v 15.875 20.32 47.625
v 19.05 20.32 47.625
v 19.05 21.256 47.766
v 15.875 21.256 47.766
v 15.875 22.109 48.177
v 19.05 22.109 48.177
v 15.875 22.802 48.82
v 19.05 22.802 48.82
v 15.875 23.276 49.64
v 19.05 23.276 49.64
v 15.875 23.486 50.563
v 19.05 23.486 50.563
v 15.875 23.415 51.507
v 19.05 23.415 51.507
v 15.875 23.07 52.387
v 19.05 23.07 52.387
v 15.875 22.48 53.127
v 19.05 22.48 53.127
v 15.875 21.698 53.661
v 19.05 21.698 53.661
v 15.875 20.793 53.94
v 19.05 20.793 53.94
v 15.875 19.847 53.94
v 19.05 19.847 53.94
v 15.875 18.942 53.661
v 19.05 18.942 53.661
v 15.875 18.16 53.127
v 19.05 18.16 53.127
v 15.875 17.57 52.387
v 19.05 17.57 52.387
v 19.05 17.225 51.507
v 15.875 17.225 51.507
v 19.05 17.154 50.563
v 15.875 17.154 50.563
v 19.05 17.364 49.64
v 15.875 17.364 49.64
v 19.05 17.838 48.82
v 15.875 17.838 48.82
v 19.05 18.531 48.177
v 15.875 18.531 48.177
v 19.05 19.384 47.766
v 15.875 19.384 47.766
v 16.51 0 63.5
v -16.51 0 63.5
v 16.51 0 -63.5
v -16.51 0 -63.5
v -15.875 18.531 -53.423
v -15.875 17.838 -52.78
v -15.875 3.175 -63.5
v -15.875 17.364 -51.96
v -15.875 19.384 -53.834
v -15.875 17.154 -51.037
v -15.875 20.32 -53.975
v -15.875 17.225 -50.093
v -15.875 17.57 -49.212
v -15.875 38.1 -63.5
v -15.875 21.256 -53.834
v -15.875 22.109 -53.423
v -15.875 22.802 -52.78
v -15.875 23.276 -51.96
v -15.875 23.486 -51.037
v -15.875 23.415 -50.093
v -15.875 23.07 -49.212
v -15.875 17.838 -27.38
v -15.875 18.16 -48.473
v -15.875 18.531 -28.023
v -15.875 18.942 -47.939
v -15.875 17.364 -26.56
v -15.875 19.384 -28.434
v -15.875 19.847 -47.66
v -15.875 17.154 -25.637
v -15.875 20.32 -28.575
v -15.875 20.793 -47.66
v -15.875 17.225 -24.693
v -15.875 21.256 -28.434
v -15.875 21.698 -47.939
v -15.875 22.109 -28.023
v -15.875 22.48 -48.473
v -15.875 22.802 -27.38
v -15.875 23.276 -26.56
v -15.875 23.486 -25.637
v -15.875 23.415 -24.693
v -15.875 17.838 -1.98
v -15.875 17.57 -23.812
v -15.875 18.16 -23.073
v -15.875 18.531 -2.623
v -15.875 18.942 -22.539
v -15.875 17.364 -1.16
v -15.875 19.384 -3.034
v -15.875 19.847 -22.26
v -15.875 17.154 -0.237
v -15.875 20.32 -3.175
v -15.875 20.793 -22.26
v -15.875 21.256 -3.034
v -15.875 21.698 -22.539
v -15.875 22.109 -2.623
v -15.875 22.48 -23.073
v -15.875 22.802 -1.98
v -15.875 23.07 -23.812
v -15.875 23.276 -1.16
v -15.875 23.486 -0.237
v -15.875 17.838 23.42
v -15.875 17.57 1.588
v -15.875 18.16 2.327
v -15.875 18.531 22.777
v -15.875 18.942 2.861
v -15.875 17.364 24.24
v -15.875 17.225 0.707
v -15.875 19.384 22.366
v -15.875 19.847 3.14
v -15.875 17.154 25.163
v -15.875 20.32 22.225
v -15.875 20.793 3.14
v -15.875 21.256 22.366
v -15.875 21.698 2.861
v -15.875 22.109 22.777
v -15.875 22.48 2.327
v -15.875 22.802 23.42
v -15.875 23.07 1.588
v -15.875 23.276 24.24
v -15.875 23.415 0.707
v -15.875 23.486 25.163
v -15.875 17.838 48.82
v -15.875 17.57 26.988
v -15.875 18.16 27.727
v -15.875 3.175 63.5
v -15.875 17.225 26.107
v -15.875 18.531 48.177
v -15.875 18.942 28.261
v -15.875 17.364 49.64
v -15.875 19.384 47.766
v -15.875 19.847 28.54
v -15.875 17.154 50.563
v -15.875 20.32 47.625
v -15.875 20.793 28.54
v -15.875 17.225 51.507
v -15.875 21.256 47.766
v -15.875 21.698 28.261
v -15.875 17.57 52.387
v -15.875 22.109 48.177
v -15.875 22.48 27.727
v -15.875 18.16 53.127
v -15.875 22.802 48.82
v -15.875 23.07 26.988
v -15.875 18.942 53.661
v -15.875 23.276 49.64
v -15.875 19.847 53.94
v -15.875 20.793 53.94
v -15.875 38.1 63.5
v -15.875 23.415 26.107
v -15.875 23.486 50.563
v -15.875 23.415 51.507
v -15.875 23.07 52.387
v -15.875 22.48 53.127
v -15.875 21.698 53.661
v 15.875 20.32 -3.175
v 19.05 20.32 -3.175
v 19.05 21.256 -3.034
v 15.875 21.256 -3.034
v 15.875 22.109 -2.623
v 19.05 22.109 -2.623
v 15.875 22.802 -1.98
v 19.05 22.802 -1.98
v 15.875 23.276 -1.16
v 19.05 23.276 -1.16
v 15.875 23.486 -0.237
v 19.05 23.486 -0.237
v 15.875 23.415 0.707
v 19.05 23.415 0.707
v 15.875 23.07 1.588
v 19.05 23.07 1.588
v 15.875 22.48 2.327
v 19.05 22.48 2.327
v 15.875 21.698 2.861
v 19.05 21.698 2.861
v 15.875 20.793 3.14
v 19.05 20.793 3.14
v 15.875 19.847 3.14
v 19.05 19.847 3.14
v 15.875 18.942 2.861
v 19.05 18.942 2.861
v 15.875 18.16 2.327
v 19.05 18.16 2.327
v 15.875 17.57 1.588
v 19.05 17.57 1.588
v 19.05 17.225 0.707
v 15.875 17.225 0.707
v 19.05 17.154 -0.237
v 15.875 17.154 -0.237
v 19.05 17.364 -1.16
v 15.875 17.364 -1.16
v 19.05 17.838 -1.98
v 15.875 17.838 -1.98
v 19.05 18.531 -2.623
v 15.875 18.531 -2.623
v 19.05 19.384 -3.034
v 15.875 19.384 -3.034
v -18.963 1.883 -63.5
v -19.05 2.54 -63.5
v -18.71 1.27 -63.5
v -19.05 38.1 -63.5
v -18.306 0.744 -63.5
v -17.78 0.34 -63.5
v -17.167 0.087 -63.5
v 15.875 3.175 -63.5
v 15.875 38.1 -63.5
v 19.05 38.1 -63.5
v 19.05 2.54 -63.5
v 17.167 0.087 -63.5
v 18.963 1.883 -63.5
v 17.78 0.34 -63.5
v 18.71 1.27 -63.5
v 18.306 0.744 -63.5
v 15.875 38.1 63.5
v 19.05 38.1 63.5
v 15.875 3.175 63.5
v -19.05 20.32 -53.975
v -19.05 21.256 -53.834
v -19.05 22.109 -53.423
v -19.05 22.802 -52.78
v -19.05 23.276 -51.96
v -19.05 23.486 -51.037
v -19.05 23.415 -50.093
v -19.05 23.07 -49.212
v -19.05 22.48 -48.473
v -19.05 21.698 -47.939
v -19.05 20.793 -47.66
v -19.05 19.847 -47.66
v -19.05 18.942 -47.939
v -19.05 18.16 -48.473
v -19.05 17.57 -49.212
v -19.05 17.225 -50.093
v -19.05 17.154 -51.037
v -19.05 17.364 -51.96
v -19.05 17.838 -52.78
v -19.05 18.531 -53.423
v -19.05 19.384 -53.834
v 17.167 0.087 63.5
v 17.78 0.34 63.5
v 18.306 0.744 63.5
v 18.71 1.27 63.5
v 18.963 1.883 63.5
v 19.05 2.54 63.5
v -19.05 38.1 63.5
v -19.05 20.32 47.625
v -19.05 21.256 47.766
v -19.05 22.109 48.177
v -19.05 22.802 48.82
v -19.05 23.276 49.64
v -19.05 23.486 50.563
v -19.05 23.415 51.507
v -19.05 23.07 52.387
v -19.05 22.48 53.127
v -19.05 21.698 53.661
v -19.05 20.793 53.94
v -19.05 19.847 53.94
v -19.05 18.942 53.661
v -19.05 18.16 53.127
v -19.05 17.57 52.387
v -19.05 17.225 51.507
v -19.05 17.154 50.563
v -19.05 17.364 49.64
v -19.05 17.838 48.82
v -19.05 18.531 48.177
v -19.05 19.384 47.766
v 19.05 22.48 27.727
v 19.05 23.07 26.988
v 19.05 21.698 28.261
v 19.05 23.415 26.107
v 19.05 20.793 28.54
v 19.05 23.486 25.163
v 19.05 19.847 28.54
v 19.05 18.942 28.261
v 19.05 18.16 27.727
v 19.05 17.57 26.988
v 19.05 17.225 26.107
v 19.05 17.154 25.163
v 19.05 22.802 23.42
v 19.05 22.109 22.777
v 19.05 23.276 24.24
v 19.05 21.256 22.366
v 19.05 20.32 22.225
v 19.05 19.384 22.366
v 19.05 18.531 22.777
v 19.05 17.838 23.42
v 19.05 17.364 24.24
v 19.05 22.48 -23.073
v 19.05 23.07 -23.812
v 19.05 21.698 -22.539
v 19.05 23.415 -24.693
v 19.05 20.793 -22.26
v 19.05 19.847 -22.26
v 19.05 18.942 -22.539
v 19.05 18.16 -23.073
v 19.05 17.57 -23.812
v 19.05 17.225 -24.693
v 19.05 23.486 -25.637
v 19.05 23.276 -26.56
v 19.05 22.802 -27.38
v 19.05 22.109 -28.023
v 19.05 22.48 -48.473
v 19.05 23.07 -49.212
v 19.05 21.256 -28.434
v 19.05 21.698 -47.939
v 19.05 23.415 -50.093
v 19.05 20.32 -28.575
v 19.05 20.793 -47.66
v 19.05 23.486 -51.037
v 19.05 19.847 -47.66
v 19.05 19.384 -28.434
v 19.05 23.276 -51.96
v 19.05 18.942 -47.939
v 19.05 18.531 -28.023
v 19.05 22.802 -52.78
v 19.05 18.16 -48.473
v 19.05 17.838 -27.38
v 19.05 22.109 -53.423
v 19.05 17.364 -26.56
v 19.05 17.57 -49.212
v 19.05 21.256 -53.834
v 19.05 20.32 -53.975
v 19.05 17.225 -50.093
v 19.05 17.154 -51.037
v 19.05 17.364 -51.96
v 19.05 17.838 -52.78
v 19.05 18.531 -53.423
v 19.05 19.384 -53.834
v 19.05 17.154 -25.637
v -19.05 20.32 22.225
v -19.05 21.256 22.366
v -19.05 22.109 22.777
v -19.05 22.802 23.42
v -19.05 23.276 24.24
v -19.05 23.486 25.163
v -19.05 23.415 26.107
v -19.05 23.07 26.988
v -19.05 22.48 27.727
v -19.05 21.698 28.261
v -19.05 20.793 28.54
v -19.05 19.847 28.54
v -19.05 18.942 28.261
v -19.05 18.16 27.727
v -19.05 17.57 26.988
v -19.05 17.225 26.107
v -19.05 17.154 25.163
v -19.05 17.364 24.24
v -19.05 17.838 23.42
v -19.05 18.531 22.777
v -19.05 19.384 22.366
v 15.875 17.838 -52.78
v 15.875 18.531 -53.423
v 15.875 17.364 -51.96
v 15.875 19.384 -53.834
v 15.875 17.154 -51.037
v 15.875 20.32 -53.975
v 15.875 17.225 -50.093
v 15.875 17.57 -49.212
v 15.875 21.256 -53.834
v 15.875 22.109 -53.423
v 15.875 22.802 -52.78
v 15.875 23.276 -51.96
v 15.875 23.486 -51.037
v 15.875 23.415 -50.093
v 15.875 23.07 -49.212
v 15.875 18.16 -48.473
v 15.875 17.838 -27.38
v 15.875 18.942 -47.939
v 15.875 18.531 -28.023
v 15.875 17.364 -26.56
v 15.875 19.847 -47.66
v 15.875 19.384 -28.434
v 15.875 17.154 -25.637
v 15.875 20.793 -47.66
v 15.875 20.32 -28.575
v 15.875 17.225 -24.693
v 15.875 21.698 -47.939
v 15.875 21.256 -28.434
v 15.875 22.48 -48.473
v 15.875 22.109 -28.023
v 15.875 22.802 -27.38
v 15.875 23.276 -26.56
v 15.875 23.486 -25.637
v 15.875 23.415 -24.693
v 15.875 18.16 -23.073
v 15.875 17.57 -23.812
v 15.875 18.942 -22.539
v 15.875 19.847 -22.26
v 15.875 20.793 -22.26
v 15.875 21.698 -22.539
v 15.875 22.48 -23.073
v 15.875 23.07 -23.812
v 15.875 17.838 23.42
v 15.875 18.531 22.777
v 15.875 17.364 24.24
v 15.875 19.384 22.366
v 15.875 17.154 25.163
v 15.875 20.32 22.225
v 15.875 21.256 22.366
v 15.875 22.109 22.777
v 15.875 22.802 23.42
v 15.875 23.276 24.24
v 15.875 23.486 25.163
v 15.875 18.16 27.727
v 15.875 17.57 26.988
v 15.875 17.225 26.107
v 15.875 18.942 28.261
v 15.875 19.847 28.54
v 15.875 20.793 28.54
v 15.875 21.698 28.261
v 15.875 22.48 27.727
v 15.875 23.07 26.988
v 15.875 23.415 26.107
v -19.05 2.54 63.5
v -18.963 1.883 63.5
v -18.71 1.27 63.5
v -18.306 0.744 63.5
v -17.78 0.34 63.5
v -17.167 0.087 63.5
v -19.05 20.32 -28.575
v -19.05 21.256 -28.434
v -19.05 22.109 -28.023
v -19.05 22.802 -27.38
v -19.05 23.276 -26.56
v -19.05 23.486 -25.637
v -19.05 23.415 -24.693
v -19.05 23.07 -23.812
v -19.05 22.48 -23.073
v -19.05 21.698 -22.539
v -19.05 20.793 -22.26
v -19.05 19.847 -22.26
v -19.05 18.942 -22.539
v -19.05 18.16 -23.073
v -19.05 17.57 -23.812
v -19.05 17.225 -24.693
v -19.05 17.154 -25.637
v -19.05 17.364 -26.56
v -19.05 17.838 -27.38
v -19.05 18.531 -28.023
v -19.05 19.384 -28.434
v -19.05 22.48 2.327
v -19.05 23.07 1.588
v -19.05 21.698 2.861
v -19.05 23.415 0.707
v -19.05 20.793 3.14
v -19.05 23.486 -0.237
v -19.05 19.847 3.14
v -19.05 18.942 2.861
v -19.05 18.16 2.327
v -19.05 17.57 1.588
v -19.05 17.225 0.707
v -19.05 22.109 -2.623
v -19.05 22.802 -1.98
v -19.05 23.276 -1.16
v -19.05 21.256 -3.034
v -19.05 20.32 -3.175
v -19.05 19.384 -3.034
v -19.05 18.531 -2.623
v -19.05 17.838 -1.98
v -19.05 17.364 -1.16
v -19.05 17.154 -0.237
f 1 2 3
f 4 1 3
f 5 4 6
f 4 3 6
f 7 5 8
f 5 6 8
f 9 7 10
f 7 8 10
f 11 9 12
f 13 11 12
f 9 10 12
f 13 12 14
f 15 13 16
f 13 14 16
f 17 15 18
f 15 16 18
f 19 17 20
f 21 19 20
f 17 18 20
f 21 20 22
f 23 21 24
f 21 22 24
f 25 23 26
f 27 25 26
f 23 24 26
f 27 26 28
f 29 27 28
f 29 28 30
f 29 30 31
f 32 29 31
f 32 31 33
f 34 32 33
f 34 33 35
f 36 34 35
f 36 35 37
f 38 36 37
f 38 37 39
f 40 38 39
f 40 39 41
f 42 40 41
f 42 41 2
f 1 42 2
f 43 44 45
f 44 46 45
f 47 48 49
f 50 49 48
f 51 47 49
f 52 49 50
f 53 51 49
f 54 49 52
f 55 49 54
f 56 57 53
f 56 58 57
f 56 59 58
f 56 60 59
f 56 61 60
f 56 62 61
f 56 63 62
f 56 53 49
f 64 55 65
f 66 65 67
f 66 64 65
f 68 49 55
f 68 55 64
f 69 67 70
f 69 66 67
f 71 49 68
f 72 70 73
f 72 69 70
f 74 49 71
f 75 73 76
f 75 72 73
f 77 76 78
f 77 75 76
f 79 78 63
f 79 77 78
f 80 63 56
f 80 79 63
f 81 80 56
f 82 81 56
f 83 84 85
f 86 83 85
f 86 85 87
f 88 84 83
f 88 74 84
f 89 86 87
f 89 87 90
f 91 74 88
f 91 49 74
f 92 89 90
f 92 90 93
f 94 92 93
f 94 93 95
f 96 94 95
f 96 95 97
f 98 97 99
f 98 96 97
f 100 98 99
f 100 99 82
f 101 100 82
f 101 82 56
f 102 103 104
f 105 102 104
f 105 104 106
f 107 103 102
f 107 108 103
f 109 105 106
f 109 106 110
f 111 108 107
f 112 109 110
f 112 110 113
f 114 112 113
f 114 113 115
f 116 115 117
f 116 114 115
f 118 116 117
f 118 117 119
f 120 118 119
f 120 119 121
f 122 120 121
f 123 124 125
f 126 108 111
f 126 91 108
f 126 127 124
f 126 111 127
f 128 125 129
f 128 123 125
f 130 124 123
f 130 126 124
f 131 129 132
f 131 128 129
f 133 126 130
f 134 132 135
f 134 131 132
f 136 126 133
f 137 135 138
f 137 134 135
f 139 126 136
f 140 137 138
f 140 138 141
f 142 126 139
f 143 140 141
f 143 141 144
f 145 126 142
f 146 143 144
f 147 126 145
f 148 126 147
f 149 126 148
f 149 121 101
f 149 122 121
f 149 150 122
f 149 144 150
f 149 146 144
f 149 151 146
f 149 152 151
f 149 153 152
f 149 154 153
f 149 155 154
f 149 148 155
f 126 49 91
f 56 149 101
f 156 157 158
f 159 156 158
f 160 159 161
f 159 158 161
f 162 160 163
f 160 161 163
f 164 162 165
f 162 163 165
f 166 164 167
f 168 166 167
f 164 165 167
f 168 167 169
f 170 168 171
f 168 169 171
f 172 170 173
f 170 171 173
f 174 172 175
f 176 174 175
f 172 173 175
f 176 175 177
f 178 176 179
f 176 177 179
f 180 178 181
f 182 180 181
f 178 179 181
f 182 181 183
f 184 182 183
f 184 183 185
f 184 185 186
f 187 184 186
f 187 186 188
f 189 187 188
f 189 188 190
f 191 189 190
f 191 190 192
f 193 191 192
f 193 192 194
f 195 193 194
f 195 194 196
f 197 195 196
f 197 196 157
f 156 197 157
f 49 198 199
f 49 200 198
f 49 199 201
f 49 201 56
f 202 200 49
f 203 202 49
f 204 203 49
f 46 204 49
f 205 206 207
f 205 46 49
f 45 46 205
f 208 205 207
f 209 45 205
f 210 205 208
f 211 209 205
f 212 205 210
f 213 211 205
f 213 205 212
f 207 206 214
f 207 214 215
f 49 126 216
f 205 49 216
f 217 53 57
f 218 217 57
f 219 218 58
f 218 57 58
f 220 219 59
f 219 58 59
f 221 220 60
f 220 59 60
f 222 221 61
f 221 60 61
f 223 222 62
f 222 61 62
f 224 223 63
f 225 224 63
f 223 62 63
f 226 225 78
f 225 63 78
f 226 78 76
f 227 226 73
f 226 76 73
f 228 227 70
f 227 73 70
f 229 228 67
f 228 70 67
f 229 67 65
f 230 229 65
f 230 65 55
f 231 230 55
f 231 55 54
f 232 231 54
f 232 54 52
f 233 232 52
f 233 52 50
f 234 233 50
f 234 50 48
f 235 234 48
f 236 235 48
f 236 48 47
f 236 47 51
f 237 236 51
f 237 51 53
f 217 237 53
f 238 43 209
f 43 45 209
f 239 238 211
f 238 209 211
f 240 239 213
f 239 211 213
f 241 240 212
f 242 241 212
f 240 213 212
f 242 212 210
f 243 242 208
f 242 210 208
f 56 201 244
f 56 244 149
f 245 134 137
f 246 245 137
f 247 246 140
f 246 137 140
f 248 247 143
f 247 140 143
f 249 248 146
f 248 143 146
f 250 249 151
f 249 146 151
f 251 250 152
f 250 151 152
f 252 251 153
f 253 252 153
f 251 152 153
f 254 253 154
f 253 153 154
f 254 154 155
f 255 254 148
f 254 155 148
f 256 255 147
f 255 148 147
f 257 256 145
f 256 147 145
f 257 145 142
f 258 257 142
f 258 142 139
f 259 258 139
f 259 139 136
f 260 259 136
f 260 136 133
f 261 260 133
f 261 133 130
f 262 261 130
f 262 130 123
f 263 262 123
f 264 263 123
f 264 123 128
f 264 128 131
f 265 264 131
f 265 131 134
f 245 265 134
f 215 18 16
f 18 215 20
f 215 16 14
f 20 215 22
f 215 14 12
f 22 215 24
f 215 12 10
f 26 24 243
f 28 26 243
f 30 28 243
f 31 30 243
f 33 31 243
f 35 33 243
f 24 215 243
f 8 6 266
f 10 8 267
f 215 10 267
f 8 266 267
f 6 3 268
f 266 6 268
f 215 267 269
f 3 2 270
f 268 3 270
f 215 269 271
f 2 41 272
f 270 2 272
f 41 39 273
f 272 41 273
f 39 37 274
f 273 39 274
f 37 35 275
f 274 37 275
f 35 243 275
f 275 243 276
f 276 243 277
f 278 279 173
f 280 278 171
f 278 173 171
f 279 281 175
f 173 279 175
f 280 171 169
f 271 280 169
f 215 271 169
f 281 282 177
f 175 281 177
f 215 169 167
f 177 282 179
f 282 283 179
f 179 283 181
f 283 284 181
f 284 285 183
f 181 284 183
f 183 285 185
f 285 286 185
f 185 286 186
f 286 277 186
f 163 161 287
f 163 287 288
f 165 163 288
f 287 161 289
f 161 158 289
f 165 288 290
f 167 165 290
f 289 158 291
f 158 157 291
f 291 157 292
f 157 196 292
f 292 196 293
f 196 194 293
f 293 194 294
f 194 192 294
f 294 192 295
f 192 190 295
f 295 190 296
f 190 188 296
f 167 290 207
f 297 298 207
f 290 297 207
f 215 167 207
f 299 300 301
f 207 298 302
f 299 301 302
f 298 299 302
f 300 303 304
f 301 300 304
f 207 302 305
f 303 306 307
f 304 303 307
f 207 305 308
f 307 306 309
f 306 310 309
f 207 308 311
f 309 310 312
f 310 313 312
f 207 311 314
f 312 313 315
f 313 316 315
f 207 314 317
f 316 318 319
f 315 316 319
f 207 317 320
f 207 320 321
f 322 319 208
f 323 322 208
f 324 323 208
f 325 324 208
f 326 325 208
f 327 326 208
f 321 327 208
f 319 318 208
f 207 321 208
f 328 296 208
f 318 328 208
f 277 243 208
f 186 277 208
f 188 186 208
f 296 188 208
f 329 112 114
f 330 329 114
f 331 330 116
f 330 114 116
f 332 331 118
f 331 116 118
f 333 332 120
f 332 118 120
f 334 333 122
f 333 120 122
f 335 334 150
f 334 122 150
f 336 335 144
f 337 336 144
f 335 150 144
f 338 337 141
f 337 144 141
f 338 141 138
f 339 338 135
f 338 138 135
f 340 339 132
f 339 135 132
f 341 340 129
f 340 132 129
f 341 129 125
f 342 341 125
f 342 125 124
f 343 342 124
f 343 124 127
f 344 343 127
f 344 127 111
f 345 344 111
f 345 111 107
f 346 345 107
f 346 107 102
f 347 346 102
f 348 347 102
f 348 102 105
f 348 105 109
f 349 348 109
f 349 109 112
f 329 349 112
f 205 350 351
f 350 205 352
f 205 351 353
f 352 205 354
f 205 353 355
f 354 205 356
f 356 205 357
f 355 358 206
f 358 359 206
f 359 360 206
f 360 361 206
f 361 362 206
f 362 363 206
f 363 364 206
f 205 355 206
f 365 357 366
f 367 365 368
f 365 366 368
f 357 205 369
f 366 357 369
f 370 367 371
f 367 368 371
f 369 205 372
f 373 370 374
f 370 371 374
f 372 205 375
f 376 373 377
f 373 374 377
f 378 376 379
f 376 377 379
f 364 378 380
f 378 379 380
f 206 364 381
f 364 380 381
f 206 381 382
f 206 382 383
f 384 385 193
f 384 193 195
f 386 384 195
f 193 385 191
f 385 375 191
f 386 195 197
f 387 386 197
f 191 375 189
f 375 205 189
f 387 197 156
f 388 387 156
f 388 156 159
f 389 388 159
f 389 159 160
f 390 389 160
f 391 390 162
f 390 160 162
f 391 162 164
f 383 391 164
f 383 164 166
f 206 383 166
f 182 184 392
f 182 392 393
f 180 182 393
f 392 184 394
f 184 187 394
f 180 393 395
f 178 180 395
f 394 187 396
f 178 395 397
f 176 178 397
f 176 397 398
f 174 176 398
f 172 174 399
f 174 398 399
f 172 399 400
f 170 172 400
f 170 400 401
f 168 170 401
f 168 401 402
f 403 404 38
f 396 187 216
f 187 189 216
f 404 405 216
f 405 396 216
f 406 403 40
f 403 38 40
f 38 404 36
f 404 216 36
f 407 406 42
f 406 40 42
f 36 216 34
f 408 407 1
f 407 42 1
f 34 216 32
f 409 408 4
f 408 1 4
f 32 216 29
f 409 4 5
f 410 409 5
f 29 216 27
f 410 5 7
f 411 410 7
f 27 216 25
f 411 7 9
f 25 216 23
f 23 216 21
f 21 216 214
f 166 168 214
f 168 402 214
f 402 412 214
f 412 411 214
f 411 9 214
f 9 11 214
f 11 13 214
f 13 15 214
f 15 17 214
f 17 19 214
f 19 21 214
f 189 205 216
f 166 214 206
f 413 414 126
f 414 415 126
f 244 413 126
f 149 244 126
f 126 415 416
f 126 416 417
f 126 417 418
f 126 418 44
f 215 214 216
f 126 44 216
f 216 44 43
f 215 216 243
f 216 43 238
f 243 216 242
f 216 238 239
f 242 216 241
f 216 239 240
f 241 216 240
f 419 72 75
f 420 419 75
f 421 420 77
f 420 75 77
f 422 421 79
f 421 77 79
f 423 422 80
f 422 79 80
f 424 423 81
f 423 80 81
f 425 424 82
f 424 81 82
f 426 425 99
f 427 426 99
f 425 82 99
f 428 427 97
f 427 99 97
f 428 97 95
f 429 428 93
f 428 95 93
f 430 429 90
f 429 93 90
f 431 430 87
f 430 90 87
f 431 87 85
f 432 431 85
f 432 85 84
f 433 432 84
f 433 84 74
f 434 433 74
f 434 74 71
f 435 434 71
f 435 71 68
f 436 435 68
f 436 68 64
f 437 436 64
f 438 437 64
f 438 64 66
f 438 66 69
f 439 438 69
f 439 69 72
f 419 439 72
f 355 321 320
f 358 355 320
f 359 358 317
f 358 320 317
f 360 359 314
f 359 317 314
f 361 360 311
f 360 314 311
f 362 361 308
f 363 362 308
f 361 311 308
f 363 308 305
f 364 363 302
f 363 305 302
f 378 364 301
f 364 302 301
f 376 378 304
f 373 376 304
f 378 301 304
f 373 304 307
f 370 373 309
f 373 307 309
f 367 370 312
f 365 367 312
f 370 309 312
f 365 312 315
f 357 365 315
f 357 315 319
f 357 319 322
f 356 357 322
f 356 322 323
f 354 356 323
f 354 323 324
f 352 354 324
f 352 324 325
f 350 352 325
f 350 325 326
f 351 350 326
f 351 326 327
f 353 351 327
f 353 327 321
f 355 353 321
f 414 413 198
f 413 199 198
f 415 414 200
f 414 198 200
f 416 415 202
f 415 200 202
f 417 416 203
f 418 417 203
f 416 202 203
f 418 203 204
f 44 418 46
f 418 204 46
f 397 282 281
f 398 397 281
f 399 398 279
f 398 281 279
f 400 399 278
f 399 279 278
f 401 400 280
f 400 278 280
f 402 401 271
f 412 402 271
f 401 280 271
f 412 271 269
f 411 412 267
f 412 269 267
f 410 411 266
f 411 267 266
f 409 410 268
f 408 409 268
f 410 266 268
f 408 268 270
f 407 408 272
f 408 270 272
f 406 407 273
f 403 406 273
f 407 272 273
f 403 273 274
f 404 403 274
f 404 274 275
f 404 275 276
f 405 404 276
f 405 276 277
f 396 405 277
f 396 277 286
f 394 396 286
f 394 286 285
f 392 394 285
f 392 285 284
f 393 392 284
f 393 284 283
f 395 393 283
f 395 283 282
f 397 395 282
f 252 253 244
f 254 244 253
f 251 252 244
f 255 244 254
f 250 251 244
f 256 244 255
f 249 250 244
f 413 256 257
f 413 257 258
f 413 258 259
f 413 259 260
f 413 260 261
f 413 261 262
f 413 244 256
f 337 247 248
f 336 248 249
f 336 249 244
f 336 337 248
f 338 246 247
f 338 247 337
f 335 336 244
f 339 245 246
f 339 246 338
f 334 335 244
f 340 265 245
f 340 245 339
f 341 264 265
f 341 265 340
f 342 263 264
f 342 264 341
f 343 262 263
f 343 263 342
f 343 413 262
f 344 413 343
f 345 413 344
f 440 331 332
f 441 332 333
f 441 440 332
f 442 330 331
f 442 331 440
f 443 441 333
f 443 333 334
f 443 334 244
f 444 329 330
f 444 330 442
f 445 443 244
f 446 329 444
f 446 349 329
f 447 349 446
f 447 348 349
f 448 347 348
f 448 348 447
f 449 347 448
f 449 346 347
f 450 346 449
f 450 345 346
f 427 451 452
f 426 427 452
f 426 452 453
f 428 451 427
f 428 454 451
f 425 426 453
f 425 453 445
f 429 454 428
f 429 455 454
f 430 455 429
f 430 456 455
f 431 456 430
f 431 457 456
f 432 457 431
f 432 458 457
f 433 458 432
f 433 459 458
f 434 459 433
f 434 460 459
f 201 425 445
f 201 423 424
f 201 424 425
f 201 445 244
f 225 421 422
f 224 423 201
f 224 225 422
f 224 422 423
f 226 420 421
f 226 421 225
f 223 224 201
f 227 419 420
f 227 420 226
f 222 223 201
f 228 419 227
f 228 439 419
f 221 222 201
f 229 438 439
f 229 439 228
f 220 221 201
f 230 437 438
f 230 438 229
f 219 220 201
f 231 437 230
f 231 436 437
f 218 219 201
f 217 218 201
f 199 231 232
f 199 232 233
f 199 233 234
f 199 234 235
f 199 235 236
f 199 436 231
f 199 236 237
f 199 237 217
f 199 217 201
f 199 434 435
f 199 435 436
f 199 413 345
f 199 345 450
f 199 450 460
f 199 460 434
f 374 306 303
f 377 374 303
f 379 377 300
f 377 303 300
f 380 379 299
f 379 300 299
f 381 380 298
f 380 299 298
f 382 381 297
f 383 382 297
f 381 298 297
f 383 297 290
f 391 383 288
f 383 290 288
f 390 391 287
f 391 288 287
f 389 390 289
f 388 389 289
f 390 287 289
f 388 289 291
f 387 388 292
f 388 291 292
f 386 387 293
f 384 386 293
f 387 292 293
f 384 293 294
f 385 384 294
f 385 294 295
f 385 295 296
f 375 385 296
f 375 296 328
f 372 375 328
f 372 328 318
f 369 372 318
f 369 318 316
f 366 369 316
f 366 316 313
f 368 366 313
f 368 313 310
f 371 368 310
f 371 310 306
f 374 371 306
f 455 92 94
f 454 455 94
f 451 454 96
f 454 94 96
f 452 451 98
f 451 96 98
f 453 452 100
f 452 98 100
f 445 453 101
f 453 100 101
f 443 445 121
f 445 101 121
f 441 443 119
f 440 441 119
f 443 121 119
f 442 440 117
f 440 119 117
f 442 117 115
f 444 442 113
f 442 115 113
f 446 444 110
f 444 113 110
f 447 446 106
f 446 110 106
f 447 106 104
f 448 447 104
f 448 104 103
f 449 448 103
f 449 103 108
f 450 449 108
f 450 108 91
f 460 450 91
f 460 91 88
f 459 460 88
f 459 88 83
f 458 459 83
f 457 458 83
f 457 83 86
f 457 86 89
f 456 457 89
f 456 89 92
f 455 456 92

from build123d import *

# Parameters (mm, degrees)
SKETCH2_W           = 38.1
SKETCH2_H           = 127
BOSS_EXTRUDE1_DEPTH = 38.1
SKETCH3_W           = 31.75
SKETCH3_H           = 34.925
CUT_EXTRUDE1_DEPTH  = 406.4
FILLET1_R           = 2.54
SKETCH4_R           = 3.175
CUT_EXTRUDE2_DEPTH  = 50.8


with BuildPart() as part:
    # Sketch2 → Boss-Extrude1 (new body)
    with BuildSketch(Plane(origin=(0, 0, 0), x_dir=(1, 0, 0), z_dir=(0, 1, 0))):
        Rectangle(SKETCH2_W, SKETCH2_H)
    extrude(amount=BOSS_EXTRUDE1_DEPTH)

    # Sketch3 → Cut-Extrude1 (cut)
    with BuildSketch(Plane.XY.offset(63.5)):
        with Locations((0, 20.6375)):
            Rectangle(SKETCH3_W, SKETCH3_H)
    extrude(amount=-CUT_EXTRUDE1_DEPTH, mode=Mode.SUBTRACT)

    # Fillet1
    fillet1_edges = [part.edges().sort_by_distance(p)[0] for p in [
        (-19.05, 0, 0),
        (19.05, 0, 0),
    ]]
    fillet(fillet1_edges, radius=FILLET1_R)

    # Sketch4 → Cut-Extrude2 (cut)
    with BuildSketch(Plane(origin=(19.05, 0, 0), x_dir=(0, 0, -1), z_dir=(1, 0, 0))):
        with Locations((-50.8, 20.32)):
            Circle(SKETCH4_R)
        with Locations((-25.4, 20.32)):
            Circle(SKETCH4_R)
        with Locations((0, 20.32)):
            Circle(SKETCH4_R)
        with Locations((25.4, 20.32)):
            Circle(SKETCH4_R)
        with Locations((50.8, 20.32)):
            Circle(SKETCH4_R)
    extrude(amount=-CUT_EXTRUDE2_DEPTH, mode=Mode.SUBTRACT)


solid = part.part
